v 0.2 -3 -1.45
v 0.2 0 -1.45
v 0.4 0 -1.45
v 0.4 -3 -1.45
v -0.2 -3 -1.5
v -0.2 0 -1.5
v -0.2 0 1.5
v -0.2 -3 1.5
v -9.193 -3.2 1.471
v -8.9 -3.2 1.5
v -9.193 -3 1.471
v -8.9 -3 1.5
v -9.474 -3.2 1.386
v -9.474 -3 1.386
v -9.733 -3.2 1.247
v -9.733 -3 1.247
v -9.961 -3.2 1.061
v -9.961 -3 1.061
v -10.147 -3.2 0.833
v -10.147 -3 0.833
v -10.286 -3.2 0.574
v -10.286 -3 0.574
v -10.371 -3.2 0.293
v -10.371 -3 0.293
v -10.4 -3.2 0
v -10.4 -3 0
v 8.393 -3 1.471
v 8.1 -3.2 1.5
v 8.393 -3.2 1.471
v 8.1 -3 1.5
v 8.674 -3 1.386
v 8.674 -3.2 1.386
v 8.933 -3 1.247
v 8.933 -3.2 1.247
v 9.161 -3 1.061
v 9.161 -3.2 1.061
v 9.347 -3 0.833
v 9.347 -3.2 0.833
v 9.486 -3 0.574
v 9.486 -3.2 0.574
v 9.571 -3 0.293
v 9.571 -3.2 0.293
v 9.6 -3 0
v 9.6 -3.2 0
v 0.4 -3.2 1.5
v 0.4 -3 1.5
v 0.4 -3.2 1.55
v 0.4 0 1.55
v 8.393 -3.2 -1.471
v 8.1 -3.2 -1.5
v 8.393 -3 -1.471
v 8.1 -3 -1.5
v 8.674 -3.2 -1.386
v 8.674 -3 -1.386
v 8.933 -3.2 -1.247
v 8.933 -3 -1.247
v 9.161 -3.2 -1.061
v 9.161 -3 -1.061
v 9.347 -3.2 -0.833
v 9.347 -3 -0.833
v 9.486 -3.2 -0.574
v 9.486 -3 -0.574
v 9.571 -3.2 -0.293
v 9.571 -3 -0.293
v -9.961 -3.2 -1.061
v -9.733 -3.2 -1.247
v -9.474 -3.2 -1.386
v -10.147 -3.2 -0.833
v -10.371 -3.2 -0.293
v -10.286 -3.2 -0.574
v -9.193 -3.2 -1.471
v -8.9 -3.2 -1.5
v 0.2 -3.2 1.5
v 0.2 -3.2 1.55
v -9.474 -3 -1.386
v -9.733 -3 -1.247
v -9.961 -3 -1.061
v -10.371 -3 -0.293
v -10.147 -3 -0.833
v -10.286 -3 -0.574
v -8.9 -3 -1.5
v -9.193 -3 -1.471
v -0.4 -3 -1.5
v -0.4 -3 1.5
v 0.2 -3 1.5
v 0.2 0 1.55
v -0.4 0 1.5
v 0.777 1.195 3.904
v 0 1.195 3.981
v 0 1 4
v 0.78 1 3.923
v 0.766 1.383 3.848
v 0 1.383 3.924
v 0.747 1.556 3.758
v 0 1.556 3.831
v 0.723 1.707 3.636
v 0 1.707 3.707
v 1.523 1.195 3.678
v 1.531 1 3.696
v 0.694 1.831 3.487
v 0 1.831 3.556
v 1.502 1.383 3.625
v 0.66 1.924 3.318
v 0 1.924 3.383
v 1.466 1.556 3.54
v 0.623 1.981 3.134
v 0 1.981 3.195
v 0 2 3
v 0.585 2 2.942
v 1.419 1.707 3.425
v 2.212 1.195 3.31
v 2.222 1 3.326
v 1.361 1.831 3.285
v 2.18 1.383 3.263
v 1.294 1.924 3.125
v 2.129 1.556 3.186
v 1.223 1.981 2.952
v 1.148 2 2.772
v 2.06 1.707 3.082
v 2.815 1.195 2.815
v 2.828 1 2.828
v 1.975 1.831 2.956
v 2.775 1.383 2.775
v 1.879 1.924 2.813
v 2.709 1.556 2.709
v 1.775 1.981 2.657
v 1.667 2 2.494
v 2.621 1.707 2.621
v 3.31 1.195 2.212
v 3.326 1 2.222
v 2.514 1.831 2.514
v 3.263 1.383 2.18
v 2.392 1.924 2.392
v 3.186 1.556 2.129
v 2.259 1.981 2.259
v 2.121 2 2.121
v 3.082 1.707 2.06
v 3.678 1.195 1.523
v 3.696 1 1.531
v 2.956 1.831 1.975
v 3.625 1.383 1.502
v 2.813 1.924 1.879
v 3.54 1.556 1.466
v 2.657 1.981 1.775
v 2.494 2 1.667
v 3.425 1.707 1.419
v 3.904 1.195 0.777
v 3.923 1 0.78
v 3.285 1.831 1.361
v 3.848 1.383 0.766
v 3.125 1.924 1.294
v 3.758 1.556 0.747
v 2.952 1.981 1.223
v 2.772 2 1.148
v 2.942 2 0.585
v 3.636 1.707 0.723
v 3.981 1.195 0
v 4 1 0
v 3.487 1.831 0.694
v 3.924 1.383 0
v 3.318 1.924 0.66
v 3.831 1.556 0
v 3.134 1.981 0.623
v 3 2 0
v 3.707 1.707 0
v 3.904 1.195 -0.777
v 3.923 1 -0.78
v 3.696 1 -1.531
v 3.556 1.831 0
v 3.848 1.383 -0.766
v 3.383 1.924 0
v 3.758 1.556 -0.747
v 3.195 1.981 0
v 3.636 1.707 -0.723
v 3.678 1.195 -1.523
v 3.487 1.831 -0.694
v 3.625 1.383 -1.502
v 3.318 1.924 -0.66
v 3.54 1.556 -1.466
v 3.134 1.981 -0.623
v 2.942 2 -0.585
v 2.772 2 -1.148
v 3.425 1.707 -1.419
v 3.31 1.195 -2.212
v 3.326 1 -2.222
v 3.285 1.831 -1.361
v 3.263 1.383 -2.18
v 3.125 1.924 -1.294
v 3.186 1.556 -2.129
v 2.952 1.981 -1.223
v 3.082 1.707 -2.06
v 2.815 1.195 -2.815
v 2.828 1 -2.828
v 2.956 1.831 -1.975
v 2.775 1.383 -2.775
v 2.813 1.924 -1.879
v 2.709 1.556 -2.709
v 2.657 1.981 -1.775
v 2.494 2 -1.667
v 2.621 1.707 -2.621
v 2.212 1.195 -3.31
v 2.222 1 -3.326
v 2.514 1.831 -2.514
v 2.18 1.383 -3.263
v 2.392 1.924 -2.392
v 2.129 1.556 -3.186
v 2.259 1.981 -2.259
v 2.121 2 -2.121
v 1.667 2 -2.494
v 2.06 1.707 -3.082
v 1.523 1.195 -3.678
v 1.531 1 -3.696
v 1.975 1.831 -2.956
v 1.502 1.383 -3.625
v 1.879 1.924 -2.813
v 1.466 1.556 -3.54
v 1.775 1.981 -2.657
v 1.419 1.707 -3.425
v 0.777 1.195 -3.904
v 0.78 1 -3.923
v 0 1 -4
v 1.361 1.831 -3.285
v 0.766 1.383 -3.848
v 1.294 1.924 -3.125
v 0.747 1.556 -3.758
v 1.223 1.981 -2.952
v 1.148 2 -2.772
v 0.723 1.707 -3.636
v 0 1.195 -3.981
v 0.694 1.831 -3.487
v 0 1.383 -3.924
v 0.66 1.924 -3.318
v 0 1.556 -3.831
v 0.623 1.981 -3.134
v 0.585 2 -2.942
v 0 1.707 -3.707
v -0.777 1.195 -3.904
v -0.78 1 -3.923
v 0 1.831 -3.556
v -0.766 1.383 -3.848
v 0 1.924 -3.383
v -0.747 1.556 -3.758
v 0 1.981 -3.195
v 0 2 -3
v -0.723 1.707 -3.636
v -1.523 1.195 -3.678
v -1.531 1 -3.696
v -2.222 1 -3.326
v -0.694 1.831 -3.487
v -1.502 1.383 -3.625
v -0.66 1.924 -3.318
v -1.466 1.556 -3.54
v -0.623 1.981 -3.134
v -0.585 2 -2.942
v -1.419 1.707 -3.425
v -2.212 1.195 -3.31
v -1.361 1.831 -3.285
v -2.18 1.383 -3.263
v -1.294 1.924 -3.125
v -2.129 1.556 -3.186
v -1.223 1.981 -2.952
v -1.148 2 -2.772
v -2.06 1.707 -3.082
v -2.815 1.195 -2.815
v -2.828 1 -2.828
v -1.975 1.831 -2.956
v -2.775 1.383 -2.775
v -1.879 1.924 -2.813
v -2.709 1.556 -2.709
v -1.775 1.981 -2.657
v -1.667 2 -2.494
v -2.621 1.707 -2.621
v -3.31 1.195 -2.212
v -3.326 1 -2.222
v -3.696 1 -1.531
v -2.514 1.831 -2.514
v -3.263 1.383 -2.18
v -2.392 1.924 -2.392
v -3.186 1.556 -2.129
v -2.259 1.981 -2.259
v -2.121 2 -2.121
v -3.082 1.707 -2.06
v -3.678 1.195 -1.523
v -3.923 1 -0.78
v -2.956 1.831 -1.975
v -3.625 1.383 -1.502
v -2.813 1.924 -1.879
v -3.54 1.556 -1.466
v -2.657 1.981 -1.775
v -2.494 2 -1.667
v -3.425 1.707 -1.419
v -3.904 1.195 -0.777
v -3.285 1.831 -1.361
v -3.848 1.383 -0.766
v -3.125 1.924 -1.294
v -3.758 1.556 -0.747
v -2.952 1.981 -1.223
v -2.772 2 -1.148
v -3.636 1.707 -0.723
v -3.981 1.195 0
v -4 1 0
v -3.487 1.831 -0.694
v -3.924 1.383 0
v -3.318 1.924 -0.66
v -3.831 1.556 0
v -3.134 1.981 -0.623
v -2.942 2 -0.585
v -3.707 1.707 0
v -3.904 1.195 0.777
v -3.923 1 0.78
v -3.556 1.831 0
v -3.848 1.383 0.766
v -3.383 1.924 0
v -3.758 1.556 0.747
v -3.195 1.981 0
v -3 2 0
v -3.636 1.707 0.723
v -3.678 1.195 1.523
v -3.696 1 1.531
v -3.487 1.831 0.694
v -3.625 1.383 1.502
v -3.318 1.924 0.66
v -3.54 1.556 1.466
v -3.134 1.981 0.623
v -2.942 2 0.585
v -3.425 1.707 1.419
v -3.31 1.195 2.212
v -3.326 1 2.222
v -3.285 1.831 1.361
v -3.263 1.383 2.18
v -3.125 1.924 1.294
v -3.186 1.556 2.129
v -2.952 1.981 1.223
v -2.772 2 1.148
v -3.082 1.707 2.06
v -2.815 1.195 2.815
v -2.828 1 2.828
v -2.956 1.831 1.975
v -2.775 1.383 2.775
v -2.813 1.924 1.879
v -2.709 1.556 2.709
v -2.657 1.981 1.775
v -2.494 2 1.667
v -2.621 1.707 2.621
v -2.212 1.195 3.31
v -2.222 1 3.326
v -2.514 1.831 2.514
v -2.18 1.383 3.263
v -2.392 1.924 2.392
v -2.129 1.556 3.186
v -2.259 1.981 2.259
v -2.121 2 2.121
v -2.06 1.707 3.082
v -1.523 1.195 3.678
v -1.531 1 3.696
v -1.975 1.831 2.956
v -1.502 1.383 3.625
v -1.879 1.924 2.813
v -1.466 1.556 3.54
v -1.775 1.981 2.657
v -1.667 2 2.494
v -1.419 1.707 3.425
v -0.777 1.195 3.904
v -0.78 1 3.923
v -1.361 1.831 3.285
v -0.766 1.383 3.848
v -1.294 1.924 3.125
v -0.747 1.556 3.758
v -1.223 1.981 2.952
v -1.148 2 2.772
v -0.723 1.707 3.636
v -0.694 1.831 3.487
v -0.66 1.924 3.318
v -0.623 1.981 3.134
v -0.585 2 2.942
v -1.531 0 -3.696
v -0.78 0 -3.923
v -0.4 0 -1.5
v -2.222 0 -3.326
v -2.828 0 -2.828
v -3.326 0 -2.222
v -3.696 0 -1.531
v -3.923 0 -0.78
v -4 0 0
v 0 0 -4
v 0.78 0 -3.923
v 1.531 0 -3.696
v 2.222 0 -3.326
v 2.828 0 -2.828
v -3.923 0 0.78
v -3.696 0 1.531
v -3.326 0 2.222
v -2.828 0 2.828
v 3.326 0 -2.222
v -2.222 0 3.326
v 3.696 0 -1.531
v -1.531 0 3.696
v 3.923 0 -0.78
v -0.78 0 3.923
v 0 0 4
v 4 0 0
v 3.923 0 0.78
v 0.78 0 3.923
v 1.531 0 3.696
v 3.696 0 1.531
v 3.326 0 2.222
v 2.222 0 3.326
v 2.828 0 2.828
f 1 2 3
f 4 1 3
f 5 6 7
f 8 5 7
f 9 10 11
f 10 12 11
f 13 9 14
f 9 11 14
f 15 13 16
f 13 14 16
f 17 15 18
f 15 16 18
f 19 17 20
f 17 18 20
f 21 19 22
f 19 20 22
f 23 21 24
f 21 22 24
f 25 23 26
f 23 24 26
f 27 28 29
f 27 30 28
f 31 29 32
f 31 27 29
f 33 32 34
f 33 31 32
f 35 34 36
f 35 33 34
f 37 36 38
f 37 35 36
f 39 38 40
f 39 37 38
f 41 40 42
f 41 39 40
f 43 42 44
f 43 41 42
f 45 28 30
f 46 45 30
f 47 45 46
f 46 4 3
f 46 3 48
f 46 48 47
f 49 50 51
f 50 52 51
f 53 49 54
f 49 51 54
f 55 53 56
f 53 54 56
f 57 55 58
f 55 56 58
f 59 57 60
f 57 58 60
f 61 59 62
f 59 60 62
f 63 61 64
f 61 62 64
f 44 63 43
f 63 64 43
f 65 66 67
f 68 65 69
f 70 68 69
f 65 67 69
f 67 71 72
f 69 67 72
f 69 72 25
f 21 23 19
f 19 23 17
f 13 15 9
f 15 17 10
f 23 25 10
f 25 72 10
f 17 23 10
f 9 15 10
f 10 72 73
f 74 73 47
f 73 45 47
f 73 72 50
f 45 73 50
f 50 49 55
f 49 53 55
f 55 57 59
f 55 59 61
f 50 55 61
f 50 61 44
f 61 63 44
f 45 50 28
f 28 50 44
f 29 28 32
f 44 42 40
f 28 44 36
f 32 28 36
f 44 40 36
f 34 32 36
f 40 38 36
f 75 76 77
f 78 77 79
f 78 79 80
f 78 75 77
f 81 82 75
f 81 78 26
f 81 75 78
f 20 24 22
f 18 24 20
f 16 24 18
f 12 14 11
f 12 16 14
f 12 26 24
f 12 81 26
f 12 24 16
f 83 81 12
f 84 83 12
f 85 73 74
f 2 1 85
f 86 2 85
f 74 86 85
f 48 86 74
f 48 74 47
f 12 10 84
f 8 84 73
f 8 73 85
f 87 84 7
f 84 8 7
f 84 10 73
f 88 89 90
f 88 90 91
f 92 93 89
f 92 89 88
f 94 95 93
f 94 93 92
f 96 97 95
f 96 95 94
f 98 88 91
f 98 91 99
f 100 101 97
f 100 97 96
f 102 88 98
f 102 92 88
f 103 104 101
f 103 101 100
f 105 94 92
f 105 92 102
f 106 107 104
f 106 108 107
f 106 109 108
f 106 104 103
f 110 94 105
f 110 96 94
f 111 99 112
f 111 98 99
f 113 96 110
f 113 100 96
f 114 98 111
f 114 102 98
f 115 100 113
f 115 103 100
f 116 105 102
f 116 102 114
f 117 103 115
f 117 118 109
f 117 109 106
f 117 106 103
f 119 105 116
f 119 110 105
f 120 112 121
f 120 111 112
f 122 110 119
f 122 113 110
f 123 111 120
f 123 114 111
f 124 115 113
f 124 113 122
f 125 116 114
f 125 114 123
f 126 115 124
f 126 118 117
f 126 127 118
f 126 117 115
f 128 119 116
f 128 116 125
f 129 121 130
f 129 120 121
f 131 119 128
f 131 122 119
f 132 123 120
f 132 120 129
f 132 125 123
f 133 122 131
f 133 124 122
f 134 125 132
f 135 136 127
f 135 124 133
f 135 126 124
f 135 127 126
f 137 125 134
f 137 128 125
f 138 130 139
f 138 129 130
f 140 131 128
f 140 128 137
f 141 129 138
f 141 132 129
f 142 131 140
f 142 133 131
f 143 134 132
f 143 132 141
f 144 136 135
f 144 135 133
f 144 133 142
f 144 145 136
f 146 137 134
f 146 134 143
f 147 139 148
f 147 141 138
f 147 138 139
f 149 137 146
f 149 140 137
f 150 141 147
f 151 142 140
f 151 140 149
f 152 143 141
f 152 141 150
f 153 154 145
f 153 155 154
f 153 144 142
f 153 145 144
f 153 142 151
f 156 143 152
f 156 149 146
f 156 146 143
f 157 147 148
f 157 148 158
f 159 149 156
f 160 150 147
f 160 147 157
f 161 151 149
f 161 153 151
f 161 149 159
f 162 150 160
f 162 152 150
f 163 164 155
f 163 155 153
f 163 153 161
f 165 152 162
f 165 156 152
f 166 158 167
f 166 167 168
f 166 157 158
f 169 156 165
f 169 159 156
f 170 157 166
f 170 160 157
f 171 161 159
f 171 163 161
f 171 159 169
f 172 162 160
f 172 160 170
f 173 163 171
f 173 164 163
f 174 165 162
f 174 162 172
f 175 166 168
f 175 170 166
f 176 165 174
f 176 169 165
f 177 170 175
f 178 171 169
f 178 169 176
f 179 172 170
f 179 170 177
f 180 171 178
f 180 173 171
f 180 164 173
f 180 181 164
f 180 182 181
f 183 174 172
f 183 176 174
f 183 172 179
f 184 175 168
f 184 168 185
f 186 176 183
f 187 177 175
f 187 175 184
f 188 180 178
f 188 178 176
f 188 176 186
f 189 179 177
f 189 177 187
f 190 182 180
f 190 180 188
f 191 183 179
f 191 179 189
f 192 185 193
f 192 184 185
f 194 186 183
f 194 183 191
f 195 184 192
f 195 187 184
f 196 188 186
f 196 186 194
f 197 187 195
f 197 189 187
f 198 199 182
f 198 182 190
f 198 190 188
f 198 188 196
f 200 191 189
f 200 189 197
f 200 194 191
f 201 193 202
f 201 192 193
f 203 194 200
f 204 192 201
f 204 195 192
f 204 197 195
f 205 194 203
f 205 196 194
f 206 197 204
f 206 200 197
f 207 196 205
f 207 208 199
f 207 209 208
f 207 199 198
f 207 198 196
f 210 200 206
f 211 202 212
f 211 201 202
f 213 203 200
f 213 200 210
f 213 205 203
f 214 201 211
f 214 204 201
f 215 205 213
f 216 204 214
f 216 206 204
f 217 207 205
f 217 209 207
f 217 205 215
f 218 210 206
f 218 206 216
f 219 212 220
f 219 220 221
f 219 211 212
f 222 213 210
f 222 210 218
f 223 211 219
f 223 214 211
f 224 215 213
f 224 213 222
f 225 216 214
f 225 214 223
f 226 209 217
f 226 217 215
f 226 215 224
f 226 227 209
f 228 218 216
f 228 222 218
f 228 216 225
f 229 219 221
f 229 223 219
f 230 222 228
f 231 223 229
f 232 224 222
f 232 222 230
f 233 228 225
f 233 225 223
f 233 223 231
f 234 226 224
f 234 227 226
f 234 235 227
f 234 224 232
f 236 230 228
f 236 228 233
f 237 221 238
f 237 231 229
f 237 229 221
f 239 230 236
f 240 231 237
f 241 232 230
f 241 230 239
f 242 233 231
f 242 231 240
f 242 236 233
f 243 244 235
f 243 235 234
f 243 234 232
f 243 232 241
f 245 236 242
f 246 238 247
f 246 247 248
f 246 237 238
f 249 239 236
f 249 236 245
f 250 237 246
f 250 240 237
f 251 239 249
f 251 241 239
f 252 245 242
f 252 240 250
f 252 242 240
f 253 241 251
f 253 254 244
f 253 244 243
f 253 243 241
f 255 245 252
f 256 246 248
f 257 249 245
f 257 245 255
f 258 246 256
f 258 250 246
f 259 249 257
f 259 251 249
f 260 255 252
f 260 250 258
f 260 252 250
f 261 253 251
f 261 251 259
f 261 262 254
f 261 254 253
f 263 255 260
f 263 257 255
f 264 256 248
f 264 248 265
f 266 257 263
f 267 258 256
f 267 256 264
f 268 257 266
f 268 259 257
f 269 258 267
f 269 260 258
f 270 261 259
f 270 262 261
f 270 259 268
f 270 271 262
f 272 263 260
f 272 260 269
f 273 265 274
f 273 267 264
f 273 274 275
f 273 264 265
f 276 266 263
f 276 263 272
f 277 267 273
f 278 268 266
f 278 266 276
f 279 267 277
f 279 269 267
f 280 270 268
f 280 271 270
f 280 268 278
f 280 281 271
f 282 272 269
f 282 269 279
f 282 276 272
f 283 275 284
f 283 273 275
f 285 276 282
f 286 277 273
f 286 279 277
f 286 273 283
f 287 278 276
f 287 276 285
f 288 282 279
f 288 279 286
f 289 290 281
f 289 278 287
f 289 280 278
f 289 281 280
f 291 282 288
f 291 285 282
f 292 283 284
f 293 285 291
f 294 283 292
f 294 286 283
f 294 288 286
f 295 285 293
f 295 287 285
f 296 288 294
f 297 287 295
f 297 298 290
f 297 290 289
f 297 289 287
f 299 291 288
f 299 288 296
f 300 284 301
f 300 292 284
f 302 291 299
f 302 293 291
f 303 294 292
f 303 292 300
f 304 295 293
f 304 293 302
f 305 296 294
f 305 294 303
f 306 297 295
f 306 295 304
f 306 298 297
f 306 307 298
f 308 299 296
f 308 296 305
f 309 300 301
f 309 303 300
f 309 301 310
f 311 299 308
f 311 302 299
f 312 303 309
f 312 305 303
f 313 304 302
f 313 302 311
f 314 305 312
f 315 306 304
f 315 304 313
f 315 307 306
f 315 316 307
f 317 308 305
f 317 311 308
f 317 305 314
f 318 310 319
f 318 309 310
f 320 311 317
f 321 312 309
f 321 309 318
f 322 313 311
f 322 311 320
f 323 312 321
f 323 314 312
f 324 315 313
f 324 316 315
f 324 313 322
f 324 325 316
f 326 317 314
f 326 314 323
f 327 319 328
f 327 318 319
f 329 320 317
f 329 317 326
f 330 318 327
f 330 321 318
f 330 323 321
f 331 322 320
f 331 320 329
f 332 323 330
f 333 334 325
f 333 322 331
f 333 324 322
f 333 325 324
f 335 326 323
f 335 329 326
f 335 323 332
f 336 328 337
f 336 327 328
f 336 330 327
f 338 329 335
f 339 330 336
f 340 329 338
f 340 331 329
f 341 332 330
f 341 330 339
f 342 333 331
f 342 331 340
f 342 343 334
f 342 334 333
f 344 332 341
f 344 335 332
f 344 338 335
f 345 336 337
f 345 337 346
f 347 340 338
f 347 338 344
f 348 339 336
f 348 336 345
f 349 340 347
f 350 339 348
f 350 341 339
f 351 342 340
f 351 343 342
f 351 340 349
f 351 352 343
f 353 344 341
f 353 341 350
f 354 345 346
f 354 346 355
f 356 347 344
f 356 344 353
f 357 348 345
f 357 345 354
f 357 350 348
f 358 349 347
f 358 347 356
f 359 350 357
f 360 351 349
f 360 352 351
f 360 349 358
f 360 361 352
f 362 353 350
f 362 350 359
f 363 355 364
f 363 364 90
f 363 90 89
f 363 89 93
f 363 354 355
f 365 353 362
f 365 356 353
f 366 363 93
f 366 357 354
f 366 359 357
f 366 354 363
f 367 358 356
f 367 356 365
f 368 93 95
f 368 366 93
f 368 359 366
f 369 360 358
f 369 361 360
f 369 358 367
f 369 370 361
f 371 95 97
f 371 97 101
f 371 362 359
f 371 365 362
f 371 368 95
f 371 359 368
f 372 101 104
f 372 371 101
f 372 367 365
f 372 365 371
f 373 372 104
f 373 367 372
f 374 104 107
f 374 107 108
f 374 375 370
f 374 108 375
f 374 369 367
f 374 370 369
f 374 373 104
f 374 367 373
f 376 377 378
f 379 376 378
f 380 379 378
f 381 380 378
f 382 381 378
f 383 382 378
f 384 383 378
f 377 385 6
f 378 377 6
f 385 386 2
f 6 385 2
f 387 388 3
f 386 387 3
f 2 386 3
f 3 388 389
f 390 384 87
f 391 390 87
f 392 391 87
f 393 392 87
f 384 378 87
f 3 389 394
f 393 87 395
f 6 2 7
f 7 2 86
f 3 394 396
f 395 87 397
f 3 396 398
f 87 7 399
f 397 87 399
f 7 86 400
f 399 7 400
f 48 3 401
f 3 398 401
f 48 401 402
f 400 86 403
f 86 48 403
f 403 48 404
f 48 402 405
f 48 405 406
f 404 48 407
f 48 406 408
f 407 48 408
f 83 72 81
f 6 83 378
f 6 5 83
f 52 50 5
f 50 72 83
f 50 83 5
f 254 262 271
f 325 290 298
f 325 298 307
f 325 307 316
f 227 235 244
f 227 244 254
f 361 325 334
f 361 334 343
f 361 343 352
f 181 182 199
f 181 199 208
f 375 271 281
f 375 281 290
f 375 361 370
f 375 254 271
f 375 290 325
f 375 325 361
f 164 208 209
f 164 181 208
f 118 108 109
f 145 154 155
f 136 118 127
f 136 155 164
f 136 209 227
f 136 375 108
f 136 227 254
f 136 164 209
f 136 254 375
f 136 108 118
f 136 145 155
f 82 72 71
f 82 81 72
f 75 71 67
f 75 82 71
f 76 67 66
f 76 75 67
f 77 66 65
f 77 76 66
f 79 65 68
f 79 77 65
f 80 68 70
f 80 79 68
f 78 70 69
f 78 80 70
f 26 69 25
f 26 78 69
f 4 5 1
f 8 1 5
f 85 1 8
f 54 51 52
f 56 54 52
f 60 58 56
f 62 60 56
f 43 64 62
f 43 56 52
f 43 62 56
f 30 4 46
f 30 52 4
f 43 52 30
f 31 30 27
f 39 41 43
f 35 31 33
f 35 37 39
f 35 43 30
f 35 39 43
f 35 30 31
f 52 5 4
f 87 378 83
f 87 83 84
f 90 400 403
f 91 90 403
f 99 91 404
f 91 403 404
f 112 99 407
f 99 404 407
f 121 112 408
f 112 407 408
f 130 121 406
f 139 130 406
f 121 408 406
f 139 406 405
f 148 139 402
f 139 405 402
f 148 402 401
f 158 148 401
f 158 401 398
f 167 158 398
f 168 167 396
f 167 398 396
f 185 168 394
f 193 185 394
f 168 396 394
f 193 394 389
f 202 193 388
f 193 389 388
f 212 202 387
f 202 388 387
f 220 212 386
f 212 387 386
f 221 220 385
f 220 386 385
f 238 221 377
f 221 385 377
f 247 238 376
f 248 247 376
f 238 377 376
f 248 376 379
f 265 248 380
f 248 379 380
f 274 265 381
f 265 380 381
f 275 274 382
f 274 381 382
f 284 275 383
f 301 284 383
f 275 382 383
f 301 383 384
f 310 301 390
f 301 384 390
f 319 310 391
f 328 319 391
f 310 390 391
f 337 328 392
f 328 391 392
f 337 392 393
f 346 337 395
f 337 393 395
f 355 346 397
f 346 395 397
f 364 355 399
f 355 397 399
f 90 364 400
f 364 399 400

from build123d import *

# Parameters (mm, degrees)
ESQUISSE1_R             = 4
BOSS_EXTRU_1_DEPTH      = 2
CONG_1_R                = 1
ESQUISSE2_W             = 0.2
ESQUISSE2_H             = 3
BOSS_EXTRU_2_DEPTH      = 3.2
BOSS_EXTRU_3_DEPTH      = 10
BOSS_EXTRU_3_DEPTH_BACK = 10
ESQUISSE3_W             = 3
ESQUISSE3_H             = 0.2
CONG_2_R                = 1.5


with BuildPart() as part:
    # Esquisse1 → Boss.-Extru.1 (new body)
    with BuildSketch(Plane(origin=(0, 0, 0), x_dir=(1, 0, 0), z_dir=(0, 1, 0))):
        with Locations(Location((0, 0, 0), (0, 0, 270))):
            Circle(ESQUISSE1_R)
    extrude(amount=BOSS_EXTRU_1_DEPTH)

    # Congé1
    cong_1_edges = [part.edges().sort_by_distance(p)[0] for p in [
        (0, 2, -4),
    ]]
    fillet(cong_1_edges, radius=CONG_1_R)

    # Esquisse2 → Boss.-Extru.2 (add)
    with BuildSketch(Plane.XZ):
        with Locations((-0.3, 0)):
            Rectangle(ESQUISSE2_W, ESQUISSE2_H)
        with Locations((0.3, 0.05)):
            Rectangle(ESQUISSE2_W, ESQUISSE2_H)
    extrude(amount=BOSS_EXTRU_2_DEPTH)

    # Esquisse3 → Boss.-Extru.3 (add, two sides: drawn at the far end of the back side and taken through both)
    with BuildSketch(Plane.ZY.offset(0.4).offset(-BOSS_EXTRU_3_DEPTH_BACK)):
        with Locations((0, -3.1)):
            Rectangle(ESQUISSE3_W, ESQUISSE3_H)
    extrude(amount=BOSS_EXTRU_3_DEPTH + BOSS_EXTRU_3_DEPTH_BACK)

    # Congé2
    cong_2_edges = [part.edges().sort_by_distance(p)[0] for p in [
        (9.6, -3.1, -1.5),
        (9.6, -3.1, 1.5),
        (-10.4, -3.1, 1.5),
        (-10.4, -3.1, -1.5),
    ]]
    fillet(cong_2_edges, radius=CONG_2_R - 0.0001)  # a hair under: the kernel refuses the full size


solid = part.part
